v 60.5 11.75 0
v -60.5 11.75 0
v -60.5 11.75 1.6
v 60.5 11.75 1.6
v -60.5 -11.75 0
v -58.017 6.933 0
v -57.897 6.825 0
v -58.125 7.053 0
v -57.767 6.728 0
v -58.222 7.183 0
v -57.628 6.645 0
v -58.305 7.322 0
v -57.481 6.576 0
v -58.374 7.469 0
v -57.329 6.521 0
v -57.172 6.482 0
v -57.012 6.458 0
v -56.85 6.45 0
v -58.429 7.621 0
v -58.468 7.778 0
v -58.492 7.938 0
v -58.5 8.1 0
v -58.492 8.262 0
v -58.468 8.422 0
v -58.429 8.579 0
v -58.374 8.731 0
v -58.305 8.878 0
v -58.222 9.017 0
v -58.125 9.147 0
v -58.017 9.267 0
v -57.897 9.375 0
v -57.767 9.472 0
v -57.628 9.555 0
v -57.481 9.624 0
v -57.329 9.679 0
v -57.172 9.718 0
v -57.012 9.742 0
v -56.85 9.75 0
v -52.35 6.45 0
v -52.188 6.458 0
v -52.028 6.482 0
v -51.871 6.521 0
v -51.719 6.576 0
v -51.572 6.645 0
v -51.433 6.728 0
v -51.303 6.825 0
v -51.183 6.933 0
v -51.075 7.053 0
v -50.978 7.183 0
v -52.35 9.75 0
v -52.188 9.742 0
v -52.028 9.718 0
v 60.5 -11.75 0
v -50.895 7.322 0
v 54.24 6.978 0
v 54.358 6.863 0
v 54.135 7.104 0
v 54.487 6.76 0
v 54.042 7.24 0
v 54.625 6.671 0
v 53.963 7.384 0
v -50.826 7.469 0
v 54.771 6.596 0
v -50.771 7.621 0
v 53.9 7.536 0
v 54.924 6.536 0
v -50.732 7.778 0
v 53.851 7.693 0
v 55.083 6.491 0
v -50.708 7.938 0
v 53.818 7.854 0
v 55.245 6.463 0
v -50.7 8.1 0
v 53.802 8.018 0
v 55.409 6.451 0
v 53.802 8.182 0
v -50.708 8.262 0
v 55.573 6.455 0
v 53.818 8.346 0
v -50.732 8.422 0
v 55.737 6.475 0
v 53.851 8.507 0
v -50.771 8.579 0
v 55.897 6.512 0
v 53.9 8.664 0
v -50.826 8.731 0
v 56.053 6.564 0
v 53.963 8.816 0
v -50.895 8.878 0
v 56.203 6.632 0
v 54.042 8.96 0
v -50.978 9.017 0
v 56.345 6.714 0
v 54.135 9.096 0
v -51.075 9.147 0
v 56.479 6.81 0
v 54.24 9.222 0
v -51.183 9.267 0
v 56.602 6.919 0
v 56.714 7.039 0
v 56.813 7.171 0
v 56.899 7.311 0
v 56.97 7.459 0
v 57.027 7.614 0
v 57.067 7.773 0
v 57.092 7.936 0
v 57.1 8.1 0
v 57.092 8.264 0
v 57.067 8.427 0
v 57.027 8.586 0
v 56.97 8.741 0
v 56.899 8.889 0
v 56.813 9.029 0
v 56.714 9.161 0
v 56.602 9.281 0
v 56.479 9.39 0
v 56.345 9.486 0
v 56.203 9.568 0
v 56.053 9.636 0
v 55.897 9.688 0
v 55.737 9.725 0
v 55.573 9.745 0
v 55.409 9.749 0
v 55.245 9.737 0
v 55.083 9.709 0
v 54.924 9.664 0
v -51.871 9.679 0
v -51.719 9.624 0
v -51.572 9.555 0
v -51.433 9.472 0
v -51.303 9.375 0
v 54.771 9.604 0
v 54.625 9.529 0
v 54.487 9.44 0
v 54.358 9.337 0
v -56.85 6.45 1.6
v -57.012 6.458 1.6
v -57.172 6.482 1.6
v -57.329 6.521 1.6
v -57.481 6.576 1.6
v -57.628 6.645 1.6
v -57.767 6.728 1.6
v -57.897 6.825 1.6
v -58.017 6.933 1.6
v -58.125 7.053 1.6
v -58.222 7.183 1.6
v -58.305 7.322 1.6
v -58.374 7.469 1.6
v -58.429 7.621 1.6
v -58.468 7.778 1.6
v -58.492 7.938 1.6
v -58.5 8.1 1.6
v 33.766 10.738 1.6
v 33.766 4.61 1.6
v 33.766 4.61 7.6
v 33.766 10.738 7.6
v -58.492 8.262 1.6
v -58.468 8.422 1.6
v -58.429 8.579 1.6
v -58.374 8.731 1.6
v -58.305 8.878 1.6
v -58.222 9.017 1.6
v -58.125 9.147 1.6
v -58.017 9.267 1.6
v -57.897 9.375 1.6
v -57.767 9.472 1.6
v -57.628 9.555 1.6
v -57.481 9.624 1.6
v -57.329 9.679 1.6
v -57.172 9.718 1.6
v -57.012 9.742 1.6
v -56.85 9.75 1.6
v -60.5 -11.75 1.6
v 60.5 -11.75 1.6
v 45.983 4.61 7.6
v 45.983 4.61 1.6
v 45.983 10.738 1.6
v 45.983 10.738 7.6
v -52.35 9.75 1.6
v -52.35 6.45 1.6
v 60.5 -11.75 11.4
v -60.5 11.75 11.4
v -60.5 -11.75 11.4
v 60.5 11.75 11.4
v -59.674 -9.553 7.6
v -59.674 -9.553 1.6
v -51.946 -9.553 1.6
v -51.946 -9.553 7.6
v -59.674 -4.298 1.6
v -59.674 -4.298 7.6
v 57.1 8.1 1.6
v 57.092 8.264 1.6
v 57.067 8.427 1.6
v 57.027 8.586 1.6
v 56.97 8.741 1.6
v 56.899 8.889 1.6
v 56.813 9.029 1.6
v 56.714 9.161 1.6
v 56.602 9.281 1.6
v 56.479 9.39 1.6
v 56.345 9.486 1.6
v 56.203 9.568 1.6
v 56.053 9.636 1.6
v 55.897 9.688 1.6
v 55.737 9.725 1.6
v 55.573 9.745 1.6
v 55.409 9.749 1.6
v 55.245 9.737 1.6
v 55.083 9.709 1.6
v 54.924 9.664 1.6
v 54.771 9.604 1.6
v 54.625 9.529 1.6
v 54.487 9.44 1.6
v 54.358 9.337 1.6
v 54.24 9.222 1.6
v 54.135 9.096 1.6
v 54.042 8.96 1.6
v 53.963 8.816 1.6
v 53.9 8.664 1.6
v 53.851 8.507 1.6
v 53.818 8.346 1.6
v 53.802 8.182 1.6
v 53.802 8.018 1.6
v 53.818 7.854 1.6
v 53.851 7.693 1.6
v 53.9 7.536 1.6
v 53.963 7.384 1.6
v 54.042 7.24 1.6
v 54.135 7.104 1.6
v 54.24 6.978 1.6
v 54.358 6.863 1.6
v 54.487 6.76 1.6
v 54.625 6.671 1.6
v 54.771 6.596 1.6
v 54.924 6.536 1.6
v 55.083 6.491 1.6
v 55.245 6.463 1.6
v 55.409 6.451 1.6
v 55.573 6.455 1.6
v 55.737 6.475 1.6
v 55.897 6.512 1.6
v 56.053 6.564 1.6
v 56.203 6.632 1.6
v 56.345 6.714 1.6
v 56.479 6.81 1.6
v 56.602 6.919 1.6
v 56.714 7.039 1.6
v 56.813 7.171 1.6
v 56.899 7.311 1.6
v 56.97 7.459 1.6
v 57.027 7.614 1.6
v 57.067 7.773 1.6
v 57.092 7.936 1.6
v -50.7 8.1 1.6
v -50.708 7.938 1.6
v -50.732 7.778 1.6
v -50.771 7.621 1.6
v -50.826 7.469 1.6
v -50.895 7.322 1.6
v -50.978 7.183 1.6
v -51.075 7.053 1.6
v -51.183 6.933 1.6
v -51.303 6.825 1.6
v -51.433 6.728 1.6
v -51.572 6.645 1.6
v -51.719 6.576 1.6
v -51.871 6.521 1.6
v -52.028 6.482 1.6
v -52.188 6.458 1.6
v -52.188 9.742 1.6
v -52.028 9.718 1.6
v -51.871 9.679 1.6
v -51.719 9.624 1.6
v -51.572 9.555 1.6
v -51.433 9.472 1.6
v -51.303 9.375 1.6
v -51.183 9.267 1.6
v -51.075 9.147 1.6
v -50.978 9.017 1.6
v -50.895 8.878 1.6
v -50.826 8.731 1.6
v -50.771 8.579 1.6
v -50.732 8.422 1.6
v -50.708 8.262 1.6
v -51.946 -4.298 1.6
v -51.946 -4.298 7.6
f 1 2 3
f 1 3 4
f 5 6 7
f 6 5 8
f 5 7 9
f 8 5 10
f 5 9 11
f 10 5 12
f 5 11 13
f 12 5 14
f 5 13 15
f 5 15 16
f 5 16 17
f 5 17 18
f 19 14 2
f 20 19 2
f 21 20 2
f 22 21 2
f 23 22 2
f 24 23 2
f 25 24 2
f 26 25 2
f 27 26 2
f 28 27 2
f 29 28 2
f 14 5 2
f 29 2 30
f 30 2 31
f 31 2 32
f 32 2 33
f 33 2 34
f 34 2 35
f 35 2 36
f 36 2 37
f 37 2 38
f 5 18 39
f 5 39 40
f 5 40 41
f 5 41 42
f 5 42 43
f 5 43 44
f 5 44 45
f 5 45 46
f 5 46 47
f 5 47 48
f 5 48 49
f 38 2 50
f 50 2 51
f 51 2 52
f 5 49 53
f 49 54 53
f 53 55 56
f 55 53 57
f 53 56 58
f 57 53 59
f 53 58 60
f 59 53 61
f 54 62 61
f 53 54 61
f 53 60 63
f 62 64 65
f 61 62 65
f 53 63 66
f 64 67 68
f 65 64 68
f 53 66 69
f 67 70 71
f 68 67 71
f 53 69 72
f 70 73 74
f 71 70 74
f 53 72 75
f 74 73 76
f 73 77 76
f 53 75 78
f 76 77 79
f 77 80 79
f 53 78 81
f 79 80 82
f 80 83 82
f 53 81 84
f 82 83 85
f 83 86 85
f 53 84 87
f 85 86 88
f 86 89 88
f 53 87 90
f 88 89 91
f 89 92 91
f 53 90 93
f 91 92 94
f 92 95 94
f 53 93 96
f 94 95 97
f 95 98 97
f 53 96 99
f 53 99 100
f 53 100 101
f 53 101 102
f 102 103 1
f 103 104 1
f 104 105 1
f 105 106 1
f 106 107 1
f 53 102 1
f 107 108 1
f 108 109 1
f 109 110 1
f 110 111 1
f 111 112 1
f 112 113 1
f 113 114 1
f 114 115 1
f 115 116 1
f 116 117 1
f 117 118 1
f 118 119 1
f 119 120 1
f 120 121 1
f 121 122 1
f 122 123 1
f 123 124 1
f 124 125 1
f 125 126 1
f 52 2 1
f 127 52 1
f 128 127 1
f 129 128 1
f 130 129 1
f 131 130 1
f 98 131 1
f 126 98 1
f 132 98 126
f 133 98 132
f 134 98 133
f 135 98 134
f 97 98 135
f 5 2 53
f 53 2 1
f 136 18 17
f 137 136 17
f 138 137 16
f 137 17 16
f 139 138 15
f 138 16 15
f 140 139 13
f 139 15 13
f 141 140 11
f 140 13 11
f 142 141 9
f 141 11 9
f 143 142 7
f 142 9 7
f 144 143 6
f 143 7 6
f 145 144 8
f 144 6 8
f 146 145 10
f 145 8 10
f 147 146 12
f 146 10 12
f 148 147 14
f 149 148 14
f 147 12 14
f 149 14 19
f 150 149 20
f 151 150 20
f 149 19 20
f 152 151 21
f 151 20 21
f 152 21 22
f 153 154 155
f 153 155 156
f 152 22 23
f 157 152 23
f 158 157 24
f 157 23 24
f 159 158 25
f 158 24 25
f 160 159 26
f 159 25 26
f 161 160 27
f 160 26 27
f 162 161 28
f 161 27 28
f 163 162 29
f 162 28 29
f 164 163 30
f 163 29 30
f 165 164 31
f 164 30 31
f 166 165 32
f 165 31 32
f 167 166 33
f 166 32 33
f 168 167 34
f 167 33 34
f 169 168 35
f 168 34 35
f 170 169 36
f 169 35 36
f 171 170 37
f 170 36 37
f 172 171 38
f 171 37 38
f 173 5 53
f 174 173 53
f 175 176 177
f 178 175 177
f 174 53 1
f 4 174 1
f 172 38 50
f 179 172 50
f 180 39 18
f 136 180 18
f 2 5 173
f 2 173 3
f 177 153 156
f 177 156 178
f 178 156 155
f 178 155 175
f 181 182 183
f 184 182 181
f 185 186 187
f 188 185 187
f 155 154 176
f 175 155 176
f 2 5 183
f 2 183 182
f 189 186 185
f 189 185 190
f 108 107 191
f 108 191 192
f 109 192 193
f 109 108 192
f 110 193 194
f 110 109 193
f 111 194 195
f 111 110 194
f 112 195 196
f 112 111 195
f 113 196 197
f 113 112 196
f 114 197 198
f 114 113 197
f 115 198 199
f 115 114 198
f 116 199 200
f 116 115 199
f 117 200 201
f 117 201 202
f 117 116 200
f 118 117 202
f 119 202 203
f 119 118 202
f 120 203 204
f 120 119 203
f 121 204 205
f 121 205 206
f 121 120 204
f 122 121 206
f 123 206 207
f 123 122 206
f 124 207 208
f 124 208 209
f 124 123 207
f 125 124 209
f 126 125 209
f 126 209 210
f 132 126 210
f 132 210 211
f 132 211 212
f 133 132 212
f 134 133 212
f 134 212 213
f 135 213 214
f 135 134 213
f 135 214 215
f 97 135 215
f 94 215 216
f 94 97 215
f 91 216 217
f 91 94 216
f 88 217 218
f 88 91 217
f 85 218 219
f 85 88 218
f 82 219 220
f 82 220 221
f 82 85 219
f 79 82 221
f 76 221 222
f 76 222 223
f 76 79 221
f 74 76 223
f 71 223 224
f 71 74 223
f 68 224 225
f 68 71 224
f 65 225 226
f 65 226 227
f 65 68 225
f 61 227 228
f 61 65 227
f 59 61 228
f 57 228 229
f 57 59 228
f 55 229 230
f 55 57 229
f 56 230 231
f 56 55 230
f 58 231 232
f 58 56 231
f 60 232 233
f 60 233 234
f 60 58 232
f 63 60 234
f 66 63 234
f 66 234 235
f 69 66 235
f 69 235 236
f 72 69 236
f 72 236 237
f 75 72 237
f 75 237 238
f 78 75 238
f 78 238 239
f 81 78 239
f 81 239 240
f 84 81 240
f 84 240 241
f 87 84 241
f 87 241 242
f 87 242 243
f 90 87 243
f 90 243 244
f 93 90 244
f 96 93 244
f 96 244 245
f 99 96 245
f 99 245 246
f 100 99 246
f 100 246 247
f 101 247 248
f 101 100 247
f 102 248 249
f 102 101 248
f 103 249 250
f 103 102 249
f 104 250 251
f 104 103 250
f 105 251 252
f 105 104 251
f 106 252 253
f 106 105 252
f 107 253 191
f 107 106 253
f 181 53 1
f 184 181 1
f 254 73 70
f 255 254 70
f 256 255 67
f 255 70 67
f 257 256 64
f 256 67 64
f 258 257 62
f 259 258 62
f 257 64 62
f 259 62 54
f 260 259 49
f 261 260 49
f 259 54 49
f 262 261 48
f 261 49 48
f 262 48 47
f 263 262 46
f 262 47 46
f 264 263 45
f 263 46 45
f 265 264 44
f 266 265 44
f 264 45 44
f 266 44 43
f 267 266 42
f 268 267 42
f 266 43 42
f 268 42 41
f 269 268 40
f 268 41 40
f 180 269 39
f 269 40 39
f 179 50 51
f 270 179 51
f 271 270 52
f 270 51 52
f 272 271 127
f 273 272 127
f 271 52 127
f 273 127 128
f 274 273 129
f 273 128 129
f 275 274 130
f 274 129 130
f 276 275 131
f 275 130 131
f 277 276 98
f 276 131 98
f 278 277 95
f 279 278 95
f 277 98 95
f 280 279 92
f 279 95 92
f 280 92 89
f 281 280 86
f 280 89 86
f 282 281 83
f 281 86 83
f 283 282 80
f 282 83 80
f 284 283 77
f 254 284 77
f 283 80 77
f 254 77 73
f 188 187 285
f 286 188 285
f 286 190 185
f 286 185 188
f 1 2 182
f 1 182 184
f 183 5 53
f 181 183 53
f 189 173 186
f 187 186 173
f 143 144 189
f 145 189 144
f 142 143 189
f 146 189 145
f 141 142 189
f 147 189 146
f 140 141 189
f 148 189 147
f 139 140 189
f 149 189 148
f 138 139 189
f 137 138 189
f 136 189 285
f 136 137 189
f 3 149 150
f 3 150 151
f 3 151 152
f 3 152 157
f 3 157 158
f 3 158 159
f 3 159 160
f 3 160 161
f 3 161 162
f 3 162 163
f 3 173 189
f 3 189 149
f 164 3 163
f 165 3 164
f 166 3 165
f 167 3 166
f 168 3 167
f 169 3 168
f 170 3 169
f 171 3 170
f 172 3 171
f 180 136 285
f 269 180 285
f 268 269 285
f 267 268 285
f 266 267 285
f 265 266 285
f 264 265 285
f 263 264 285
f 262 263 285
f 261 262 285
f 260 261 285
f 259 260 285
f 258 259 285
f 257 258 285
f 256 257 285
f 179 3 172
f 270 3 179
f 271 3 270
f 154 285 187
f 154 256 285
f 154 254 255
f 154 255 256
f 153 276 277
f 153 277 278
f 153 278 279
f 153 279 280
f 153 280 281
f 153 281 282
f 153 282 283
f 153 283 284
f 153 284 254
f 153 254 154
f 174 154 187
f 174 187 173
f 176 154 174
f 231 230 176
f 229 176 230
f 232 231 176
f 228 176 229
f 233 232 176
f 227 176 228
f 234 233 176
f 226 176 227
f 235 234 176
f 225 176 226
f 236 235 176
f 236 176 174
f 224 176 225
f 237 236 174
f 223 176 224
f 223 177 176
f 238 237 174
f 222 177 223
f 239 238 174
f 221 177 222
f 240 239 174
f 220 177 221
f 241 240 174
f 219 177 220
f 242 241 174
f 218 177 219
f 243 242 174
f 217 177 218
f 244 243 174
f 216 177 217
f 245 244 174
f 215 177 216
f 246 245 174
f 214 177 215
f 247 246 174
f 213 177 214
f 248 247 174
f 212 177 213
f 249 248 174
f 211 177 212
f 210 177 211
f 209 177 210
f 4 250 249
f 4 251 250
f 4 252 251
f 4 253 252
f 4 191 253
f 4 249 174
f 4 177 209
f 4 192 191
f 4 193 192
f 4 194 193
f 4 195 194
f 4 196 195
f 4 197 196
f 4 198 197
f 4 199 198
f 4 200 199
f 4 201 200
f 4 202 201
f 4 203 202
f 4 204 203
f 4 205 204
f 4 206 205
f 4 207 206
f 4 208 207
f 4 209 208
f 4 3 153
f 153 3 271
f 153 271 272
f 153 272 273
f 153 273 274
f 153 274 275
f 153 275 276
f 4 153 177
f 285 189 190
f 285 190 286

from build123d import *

# Parameters (mm, degrees)
F0_W     = 121
F0_H     = 23.5
F0_R     = 1.65
F1_DEPTH = 1.6
F2_W     = 121
F2_H     = 23.5
F3_DEPTH = 11.4
F4_W     = 12.216829
F4_H     = 6.128608
F4_W_2   = 7.727265
F4_H_2   = 5.254211
F5_DEPTH = 6


with BuildPart() as f1:
    # F0 (on Top) → F1 (new body)
    with BuildSketch(Plane.XY):
        Rectangle(F0_W, F0_H)
        with BuildLine():
            ThreePointArc((-58.5, 8.1), (-58.016726, 9.266726), (-56.85, 9.75))
            Line((-56.85, 9.75), (-52.35, 9.75))
            ThreePointArc((-52.35, 9.75), (-51.183274, 9.266726), (-50.7, 8.1))
            ThreePointArc((-50.7, 8.1), (-51.183274, 6.933274), (-52.35, 6.45))
            Line((-52.35, 6.45), (-56.85, 6.45))
            ThreePointArc((-56.85, 6.45), (-58.016726, 6.933274), (-58.5, 8.1))
        make_face(mode=Mode.SUBTRACT)
        with Locations((55.45, 8.1)):
            Circle(F0_R, mode=Mode.SUBTRACT)
    extrude(amount=F1_DEPTH)

    # F4 (on face) → F5 (join)
    with BuildSketch(Plane.XY.offset(1.6)):
        with Locations((39.874763, 7.674096)):
            Rectangle(F4_W, F4_H)
        with Locations((-55.809871, -6.925545)):
            Rectangle(F4_W_2, F4_H_2)
    extrude(amount=F5_DEPTH)


with BuildPart() as f3:
    # F2 (on face) → F3 (new body)
    with BuildSketch(Plane.XY):
        Rectangle(F2_W, F2_H)
    extrude(amount=F3_DEPTH)


solid = Compound([f1.part, f3.part])
